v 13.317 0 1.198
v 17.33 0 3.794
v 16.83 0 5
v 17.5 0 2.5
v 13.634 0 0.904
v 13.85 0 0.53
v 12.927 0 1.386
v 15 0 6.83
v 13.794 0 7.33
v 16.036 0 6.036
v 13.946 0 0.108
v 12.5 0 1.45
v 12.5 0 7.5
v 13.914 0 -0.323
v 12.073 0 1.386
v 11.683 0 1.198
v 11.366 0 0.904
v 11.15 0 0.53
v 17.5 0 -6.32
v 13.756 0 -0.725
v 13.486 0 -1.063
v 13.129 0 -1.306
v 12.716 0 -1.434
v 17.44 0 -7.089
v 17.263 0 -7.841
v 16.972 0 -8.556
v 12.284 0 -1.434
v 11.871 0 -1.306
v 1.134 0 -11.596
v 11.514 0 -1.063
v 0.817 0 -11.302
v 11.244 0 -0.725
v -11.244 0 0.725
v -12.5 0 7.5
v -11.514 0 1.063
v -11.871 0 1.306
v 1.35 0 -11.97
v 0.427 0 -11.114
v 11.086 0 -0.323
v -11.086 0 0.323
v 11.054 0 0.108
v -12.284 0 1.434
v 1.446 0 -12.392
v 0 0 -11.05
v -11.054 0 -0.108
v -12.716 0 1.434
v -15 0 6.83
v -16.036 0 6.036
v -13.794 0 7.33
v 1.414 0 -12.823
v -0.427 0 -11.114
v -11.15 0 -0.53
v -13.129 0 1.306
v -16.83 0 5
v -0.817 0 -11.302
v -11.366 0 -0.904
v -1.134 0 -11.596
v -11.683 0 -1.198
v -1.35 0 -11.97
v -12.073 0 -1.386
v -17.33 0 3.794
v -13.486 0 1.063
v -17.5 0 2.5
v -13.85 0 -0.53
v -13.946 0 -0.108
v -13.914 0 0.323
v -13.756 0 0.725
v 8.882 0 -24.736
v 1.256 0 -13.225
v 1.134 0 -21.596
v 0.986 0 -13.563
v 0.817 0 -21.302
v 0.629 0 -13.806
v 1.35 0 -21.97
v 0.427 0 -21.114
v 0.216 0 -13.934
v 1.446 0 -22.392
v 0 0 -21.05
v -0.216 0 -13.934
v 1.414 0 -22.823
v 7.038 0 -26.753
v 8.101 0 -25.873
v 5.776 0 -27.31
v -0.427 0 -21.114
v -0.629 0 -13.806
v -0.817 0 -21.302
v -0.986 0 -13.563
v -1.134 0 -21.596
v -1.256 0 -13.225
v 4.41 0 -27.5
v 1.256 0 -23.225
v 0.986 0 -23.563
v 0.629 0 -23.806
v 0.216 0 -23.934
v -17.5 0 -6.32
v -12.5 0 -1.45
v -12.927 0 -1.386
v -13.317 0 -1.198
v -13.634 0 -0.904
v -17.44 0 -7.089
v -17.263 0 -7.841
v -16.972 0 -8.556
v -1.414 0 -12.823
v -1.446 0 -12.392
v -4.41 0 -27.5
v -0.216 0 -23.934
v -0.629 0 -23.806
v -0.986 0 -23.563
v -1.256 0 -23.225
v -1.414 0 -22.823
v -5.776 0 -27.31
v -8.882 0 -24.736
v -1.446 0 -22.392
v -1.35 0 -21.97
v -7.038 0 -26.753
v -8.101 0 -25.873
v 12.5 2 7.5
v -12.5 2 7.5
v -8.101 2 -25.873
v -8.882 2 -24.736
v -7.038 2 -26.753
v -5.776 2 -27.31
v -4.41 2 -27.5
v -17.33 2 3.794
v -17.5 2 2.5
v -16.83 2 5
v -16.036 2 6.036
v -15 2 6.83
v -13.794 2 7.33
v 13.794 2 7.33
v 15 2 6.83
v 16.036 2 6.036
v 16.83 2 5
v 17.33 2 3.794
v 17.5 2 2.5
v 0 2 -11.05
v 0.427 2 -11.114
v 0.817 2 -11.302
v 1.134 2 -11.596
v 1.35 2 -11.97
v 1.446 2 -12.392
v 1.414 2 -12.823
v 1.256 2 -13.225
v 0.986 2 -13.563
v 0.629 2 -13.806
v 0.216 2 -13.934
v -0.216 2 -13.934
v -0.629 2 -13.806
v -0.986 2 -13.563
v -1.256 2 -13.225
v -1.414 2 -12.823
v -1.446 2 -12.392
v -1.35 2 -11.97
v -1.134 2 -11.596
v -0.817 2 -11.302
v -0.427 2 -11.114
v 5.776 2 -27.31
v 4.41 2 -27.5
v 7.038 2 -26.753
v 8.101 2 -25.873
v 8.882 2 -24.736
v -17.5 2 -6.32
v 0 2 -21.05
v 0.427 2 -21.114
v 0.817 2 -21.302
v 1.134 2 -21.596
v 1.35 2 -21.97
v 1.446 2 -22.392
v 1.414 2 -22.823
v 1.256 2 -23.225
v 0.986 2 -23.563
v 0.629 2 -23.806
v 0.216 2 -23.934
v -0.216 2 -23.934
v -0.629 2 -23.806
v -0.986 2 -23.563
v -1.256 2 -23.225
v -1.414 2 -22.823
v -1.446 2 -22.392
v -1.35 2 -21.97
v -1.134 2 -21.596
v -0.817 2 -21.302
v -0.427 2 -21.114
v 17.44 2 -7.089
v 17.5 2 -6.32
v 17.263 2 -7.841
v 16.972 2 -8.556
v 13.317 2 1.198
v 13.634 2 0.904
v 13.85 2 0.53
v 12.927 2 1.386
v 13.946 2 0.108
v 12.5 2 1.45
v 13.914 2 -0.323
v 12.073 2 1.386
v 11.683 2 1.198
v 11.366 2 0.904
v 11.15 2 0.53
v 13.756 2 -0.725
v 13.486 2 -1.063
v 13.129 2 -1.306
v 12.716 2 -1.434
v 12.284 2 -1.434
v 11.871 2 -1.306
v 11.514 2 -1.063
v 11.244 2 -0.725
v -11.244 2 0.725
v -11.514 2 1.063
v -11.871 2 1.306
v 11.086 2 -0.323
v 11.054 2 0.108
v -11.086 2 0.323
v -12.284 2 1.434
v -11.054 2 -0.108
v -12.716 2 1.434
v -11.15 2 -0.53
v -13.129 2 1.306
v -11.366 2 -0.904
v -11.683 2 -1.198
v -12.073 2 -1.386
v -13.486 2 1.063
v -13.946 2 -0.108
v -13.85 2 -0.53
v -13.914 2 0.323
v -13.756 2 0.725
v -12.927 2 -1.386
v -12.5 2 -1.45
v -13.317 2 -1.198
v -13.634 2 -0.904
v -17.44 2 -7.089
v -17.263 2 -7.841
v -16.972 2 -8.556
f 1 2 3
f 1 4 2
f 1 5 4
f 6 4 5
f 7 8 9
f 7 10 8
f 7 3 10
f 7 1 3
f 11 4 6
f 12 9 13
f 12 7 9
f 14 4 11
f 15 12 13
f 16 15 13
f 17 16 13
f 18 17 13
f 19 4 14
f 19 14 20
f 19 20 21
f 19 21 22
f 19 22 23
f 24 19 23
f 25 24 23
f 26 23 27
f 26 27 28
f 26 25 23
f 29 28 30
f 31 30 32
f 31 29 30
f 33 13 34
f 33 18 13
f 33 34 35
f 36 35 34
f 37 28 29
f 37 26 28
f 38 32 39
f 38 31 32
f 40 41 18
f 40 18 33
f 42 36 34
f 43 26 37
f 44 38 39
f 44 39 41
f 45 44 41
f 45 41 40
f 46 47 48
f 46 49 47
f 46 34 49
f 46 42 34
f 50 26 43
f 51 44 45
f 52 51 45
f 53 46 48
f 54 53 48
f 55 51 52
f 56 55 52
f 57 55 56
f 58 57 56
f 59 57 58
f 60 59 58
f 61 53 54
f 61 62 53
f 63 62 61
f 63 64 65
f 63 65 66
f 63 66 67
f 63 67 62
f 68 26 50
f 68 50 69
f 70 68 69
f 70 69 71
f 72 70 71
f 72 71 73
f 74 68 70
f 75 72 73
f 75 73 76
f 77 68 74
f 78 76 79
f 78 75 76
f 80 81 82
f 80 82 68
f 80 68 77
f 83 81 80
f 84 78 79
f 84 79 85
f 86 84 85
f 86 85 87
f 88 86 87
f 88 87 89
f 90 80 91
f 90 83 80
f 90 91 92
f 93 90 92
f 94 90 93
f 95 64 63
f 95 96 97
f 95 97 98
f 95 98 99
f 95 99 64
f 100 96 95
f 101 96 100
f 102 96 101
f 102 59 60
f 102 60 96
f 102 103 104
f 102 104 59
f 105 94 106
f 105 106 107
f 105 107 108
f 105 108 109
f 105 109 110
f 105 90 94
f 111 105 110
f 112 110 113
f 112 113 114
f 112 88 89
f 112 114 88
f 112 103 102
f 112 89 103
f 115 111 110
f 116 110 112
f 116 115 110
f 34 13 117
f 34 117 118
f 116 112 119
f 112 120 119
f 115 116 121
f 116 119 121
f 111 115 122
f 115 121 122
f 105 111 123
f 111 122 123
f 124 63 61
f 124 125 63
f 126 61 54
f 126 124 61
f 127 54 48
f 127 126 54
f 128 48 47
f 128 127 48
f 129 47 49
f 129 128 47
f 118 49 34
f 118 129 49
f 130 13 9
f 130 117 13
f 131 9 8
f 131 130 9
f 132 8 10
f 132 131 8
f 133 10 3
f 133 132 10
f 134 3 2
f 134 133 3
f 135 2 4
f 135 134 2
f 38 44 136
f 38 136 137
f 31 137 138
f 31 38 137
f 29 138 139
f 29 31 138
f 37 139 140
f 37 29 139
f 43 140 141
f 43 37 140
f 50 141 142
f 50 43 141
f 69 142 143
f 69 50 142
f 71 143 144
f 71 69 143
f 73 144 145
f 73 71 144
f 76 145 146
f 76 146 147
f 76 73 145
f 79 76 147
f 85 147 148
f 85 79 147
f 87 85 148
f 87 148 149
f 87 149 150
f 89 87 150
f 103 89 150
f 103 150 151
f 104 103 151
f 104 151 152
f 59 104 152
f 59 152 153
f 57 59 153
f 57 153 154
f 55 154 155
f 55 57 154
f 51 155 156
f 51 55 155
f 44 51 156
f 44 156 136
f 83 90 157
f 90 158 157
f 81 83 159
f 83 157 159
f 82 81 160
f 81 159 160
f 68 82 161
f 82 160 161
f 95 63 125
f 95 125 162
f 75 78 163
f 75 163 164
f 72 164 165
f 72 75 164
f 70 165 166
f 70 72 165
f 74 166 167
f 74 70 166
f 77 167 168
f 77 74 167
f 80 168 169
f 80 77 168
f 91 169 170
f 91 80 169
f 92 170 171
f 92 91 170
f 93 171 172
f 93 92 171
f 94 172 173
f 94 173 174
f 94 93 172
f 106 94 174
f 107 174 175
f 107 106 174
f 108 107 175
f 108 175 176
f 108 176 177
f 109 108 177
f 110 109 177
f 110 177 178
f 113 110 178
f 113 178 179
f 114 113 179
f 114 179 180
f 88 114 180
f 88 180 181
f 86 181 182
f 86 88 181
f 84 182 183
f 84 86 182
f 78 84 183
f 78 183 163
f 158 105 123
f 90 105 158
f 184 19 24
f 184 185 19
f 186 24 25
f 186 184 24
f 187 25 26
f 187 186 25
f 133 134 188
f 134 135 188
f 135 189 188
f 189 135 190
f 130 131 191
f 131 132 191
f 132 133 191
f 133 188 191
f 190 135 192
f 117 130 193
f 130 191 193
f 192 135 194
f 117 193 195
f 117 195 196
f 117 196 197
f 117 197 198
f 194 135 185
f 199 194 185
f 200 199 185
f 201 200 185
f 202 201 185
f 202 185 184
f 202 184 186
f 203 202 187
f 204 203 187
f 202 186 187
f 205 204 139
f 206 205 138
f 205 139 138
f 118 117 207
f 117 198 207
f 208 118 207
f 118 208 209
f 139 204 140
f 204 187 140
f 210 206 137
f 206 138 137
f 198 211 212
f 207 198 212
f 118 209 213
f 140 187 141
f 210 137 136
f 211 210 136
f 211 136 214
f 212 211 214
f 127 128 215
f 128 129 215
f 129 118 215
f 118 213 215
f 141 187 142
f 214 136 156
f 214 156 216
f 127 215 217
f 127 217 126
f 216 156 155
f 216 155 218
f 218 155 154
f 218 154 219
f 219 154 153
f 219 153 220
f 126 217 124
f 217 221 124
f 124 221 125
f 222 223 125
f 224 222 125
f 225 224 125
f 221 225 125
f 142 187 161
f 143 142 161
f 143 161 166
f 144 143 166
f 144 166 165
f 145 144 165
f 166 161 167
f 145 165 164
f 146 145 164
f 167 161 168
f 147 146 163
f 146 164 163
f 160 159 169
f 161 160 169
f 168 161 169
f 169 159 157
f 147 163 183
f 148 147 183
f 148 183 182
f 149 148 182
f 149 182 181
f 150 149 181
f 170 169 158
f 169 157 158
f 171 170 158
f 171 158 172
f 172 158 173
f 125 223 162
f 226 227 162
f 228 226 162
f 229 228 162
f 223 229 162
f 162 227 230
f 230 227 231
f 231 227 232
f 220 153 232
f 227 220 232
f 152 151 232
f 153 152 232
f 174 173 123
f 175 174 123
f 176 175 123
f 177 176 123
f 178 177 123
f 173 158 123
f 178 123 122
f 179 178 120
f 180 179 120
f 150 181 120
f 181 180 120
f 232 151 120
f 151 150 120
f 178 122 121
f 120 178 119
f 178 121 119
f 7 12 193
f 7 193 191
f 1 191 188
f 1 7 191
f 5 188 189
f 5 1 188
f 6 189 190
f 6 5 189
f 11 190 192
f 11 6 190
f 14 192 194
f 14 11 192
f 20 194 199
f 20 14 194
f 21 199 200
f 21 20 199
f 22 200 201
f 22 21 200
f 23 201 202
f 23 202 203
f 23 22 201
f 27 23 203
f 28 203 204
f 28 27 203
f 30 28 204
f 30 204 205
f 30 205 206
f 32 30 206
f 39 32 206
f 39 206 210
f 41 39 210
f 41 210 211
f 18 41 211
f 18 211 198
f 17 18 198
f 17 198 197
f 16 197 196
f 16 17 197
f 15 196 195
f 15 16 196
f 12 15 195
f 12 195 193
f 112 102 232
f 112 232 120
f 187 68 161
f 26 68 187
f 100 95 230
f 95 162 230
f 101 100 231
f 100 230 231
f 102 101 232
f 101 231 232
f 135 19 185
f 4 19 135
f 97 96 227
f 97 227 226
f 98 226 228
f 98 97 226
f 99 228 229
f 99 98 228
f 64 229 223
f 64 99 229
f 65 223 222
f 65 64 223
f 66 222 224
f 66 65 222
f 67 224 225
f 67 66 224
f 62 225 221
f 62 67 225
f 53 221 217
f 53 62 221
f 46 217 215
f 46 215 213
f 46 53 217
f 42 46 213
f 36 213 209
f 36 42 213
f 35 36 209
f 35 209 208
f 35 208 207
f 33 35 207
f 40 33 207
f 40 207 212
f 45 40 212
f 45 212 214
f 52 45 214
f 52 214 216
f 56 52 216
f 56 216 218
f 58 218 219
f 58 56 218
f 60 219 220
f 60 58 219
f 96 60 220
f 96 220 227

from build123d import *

# Parameters (mm, degrees)
SKETCH_1_R      = 1.45
EXTRUDE_1_DEPTH = 2
FILLET_1_R      = 5


with BuildPart() as part:
    # 草图1 → 凸台-拉伸1 (new body)
    with BuildSketch(Plane(origin=(0, 0, 0), x_dir=(1, 0, 0), z_dir=(0, 1, 0))):
        Polygon((-17.5, -7.5), (-17.5, 7.5), (-7.5, 27.5), (7.5, 27.5), (17.5, 7.5), (17.5, -7.5), align=None)
        with Locations(Location((12.5, 0, 0), (0, 0, 270))):
            Circle(SKETCH_1_R, mode=Mode.SUBTRACT)
        with Locations(Location((0, 12.5, 0), (0, 0, 270))):
            Circle(SKETCH_1_R, mode=Mode.SUBTRACT)
        with Locations(Location((0, 22.5, 0), (0, 0, 270))):
            Circle(SKETCH_1_R, mode=Mode.SUBTRACT)
        with Locations(Location((-12.5, 0, 0), (0, 0, 90))):
            Circle(SKETCH_1_R, mode=Mode.SUBTRACT)
    extrude(amount=EXTRUDE_1_DEPTH)

    # 圆角1
    fillet_1_edges = [part.edges().sort_by_distance(p)[0] for p in [
        (17.5, 1, 7.5),
        (-17.5, 1, 7.5),
        (-17.5, 1, -7.5),
        (-7.5, 1, -27.5),
        (7.5, 1, -27.5),
        (17.5, 1, -7.5),
    ]]
    fillet(fillet_1_edges, radius=FILLET_1_R)


solid = part.part
